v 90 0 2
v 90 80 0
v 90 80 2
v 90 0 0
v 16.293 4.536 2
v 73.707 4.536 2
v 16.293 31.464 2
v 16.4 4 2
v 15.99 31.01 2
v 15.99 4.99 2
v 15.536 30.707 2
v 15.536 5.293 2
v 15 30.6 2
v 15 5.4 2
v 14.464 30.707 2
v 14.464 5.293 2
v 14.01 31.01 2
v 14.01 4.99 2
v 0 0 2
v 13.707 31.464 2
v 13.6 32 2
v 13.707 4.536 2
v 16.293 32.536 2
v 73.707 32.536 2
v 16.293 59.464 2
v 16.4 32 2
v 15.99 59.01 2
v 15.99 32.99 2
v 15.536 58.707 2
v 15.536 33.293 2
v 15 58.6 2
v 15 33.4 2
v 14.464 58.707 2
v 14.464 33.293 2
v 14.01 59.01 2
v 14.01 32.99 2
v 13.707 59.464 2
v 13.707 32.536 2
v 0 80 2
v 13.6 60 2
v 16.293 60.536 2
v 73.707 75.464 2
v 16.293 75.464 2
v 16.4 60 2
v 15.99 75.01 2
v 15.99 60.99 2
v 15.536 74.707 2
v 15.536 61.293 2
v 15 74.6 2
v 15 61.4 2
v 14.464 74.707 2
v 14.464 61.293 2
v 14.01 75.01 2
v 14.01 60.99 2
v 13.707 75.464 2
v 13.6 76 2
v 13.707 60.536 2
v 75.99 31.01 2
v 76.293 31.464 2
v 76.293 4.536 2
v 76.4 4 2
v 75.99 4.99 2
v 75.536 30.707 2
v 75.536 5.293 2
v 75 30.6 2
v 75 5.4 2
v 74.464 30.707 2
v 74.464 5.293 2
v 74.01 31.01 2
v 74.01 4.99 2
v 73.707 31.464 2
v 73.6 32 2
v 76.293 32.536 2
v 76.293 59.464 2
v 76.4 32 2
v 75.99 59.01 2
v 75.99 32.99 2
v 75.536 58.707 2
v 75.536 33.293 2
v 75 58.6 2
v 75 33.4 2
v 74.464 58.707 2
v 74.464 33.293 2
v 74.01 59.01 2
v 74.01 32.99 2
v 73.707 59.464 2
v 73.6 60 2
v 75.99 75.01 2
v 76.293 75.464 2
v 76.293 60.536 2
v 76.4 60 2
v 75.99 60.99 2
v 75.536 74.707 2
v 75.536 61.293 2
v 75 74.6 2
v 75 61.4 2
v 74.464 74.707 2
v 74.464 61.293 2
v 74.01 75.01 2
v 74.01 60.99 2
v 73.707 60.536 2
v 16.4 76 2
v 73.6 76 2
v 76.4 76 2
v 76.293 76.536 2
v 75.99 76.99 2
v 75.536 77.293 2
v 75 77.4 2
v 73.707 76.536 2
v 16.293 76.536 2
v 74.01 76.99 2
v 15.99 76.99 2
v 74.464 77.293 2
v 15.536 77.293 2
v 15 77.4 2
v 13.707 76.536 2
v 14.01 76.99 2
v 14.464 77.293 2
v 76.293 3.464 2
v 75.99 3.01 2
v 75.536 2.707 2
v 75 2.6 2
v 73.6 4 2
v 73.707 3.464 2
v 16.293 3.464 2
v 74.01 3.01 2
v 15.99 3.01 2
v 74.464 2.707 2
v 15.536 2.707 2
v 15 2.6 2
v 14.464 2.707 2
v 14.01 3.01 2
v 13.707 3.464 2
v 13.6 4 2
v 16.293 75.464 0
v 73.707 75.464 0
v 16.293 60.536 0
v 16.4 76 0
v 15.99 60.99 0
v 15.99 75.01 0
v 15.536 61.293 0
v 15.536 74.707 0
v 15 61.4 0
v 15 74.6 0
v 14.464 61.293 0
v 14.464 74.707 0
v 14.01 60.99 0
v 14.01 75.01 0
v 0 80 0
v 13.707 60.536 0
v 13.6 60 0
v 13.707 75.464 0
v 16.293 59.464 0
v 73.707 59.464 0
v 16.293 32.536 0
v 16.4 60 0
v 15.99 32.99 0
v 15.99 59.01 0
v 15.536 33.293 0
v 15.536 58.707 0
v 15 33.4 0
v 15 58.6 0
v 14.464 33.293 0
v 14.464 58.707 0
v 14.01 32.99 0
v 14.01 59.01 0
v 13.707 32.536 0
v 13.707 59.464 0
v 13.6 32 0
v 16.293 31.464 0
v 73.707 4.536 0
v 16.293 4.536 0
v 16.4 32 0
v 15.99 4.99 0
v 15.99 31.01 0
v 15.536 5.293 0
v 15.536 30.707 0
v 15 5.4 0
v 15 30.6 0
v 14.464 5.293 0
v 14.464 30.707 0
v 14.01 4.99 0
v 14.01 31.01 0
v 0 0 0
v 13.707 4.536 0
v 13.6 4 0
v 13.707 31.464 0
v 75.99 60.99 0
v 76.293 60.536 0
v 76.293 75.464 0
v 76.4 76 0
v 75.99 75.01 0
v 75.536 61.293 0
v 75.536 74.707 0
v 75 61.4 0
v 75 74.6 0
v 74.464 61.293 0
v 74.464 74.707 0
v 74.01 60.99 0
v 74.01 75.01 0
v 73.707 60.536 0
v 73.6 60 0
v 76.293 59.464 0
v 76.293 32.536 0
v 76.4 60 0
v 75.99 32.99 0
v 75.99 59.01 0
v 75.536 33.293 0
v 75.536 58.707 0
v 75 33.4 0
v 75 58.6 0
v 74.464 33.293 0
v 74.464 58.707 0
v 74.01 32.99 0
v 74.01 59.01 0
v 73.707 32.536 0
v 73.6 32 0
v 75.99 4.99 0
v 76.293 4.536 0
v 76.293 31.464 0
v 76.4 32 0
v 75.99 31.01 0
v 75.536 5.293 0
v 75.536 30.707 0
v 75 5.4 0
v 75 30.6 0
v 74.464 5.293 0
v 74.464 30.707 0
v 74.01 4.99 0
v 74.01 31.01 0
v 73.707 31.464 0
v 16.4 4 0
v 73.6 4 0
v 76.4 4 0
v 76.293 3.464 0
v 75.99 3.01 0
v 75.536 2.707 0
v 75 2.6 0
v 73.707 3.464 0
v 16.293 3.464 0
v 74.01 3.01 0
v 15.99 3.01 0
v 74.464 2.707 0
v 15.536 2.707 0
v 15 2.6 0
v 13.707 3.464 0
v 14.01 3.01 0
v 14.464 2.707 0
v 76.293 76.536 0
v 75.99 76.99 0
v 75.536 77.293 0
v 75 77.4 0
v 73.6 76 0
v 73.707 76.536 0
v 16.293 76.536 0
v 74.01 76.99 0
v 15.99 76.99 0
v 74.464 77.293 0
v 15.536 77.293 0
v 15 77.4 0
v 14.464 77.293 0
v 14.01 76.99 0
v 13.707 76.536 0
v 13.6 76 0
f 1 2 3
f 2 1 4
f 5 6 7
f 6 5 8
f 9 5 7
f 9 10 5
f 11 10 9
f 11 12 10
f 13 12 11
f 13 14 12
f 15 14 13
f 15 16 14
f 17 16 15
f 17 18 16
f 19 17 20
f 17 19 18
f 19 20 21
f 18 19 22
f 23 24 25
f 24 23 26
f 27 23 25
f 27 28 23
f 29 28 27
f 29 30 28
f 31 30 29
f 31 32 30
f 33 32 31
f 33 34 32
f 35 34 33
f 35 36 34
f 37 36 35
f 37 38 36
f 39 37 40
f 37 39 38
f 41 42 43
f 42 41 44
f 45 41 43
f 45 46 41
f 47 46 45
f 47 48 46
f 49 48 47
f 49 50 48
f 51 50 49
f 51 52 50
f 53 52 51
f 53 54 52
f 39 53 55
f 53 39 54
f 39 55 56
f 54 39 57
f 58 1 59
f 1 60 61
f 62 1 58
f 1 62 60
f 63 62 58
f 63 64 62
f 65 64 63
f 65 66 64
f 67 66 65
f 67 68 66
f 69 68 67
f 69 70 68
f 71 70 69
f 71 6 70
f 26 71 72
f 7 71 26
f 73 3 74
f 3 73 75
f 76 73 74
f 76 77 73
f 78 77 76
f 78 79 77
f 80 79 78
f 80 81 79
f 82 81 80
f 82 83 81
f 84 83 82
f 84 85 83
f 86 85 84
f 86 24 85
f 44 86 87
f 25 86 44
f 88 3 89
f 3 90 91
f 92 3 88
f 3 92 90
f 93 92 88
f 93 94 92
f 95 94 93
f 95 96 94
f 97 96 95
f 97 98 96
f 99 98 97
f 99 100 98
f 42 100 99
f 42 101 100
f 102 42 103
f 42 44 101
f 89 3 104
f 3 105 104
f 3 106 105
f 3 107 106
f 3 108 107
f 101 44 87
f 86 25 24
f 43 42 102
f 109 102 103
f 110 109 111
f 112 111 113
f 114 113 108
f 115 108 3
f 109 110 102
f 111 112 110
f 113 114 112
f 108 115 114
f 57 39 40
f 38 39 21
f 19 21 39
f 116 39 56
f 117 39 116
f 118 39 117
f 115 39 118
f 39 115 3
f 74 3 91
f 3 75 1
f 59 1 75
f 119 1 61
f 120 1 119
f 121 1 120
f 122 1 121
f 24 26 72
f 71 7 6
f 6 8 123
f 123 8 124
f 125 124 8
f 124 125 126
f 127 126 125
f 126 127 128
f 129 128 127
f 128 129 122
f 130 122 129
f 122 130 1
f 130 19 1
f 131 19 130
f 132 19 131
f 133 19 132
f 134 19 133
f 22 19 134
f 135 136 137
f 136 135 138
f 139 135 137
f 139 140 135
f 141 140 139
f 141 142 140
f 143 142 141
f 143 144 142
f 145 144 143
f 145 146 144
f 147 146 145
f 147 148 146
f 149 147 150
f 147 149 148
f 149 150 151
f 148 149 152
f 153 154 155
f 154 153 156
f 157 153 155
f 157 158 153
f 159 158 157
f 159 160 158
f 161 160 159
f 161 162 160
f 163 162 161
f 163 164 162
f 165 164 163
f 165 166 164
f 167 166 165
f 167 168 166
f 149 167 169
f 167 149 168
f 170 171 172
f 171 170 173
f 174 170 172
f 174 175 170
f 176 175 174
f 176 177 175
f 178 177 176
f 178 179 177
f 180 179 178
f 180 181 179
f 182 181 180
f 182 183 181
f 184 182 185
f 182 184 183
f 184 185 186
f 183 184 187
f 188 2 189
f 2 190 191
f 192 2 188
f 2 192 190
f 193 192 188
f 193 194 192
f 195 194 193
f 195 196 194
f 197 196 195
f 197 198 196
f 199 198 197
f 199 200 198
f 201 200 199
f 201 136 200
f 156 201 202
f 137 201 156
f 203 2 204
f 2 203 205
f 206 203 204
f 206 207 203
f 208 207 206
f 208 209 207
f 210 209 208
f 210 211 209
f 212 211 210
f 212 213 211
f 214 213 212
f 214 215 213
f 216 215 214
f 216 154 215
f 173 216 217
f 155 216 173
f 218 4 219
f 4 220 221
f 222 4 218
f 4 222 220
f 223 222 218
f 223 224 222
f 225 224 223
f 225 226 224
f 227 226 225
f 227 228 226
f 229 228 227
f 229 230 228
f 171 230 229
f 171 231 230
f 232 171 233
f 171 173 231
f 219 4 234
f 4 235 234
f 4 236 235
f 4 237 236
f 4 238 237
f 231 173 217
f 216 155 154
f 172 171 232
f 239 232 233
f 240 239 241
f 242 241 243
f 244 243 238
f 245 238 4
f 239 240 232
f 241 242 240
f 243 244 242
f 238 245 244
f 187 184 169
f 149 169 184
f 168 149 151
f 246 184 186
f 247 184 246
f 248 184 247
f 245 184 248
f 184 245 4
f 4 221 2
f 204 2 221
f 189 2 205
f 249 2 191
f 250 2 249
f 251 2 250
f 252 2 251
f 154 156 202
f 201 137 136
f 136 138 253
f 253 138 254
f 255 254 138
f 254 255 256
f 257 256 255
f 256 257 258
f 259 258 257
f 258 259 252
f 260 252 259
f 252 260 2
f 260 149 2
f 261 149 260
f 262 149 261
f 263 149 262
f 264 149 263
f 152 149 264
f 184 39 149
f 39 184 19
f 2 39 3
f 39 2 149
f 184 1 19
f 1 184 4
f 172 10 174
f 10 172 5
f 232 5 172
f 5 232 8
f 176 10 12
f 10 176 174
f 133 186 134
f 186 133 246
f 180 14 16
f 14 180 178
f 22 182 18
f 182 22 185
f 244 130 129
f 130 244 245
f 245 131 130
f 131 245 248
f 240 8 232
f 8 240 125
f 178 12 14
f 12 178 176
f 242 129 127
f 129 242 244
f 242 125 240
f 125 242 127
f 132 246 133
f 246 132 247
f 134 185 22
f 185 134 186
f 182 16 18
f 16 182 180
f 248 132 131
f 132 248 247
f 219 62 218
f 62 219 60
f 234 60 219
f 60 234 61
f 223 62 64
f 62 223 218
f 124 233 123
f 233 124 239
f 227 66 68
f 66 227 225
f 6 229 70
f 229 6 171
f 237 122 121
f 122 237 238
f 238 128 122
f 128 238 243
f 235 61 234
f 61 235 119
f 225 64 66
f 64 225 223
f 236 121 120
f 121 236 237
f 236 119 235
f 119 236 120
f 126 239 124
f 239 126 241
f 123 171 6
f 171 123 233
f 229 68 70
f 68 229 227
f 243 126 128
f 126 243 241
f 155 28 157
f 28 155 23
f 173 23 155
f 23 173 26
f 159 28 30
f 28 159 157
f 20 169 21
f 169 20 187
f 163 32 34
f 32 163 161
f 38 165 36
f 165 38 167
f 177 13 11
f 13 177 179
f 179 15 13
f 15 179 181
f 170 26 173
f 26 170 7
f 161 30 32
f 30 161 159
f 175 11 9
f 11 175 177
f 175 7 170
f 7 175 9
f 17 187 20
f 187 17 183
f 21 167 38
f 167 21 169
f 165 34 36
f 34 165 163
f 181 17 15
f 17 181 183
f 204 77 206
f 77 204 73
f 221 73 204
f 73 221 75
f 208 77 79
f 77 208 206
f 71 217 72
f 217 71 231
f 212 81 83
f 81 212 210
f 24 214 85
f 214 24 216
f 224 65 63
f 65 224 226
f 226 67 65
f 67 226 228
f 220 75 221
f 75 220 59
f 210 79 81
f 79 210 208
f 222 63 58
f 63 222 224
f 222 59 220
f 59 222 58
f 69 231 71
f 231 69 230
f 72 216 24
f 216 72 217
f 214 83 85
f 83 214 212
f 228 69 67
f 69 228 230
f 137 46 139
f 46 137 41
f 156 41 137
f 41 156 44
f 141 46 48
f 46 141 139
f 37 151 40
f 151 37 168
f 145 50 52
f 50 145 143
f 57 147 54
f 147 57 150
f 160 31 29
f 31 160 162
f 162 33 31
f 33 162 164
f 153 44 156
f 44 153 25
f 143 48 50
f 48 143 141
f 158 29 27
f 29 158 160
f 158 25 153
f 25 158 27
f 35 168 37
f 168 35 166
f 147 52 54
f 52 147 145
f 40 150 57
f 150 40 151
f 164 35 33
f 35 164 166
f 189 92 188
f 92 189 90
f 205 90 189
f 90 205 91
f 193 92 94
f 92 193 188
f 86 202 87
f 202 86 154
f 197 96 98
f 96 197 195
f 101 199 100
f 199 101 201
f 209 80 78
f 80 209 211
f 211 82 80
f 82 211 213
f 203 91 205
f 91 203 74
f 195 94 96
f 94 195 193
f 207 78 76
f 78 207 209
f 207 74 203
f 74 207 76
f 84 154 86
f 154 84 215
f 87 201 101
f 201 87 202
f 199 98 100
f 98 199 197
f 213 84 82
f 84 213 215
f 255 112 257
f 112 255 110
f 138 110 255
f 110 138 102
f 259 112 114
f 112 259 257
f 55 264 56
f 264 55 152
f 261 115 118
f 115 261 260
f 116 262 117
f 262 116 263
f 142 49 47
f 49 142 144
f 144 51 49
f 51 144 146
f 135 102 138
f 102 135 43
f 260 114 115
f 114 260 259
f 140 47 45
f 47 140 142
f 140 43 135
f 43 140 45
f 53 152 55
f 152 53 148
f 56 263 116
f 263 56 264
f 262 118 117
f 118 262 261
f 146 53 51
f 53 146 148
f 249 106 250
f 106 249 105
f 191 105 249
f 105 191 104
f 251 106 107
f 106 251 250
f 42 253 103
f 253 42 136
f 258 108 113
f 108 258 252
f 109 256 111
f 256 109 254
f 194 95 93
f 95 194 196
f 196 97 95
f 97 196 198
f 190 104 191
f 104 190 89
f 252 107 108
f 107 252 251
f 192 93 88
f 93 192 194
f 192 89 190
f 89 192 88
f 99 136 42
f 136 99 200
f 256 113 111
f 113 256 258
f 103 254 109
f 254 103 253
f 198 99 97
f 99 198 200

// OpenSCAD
back_x_size = 90;
back_y_size = 80;
back_z_size = 2;

tap_hole_depth = 10;
tap_hole_r = 2.8/2; //M3.0 - 0.2

difference(){
	cube(size = [back_x_size, back_y_size, back_z_size], center = false);

//1F	
	translate([15 , 4, back_z_size]) {
		cylinder( h = tap_hole_depth, r = tap_hole_r, center = true , $fn=16 );
	}
	translate([back_x_size - 15 , 4, back_z_size]) {
		cylinder( h = tap_hole_depth, r = tap_hole_r, center = true , $fn=16 );
	}
//2F
	translate([15 , 4 + 28, back_z_size]) {
		cylinder( h = tap_hole_depth, r = tap_hole_r, center = true , $fn=16 );
	}
	translate([back_x_size - 15 , 4 + 28, back_z_size]) {
		cylinder( h = tap_hole_depth, r = tap_hole_r, center = true , $fn=16 );
	}
//3F
	translate([15 , 4 + 28*2, back_z_size]) {
		cylinder( h = tap_hole_depth, r = tap_hole_r, center = true , $fn=16 );
	}
	translate([back_x_size - 15 , 4 + 28*2, back_z_size]) {
		cylinder( h = tap_hole_depth, r = tap_hole_r, center = true , $fn=16 );
	}
//top
	translate([15 , 4 + 28*2 + 16, back_z_size]) {
		cylinder( h = tap_hole_depth, r = tap_hole_r, center = true , $fn=16 );
	}
	translate([back_x_size - 15 , 4 + 28*2 + 16, back_z_size]) {
		cylinder( h = tap_hole_depth, r = tap_hole_r, center = true , $fn=16 );
	}

}
